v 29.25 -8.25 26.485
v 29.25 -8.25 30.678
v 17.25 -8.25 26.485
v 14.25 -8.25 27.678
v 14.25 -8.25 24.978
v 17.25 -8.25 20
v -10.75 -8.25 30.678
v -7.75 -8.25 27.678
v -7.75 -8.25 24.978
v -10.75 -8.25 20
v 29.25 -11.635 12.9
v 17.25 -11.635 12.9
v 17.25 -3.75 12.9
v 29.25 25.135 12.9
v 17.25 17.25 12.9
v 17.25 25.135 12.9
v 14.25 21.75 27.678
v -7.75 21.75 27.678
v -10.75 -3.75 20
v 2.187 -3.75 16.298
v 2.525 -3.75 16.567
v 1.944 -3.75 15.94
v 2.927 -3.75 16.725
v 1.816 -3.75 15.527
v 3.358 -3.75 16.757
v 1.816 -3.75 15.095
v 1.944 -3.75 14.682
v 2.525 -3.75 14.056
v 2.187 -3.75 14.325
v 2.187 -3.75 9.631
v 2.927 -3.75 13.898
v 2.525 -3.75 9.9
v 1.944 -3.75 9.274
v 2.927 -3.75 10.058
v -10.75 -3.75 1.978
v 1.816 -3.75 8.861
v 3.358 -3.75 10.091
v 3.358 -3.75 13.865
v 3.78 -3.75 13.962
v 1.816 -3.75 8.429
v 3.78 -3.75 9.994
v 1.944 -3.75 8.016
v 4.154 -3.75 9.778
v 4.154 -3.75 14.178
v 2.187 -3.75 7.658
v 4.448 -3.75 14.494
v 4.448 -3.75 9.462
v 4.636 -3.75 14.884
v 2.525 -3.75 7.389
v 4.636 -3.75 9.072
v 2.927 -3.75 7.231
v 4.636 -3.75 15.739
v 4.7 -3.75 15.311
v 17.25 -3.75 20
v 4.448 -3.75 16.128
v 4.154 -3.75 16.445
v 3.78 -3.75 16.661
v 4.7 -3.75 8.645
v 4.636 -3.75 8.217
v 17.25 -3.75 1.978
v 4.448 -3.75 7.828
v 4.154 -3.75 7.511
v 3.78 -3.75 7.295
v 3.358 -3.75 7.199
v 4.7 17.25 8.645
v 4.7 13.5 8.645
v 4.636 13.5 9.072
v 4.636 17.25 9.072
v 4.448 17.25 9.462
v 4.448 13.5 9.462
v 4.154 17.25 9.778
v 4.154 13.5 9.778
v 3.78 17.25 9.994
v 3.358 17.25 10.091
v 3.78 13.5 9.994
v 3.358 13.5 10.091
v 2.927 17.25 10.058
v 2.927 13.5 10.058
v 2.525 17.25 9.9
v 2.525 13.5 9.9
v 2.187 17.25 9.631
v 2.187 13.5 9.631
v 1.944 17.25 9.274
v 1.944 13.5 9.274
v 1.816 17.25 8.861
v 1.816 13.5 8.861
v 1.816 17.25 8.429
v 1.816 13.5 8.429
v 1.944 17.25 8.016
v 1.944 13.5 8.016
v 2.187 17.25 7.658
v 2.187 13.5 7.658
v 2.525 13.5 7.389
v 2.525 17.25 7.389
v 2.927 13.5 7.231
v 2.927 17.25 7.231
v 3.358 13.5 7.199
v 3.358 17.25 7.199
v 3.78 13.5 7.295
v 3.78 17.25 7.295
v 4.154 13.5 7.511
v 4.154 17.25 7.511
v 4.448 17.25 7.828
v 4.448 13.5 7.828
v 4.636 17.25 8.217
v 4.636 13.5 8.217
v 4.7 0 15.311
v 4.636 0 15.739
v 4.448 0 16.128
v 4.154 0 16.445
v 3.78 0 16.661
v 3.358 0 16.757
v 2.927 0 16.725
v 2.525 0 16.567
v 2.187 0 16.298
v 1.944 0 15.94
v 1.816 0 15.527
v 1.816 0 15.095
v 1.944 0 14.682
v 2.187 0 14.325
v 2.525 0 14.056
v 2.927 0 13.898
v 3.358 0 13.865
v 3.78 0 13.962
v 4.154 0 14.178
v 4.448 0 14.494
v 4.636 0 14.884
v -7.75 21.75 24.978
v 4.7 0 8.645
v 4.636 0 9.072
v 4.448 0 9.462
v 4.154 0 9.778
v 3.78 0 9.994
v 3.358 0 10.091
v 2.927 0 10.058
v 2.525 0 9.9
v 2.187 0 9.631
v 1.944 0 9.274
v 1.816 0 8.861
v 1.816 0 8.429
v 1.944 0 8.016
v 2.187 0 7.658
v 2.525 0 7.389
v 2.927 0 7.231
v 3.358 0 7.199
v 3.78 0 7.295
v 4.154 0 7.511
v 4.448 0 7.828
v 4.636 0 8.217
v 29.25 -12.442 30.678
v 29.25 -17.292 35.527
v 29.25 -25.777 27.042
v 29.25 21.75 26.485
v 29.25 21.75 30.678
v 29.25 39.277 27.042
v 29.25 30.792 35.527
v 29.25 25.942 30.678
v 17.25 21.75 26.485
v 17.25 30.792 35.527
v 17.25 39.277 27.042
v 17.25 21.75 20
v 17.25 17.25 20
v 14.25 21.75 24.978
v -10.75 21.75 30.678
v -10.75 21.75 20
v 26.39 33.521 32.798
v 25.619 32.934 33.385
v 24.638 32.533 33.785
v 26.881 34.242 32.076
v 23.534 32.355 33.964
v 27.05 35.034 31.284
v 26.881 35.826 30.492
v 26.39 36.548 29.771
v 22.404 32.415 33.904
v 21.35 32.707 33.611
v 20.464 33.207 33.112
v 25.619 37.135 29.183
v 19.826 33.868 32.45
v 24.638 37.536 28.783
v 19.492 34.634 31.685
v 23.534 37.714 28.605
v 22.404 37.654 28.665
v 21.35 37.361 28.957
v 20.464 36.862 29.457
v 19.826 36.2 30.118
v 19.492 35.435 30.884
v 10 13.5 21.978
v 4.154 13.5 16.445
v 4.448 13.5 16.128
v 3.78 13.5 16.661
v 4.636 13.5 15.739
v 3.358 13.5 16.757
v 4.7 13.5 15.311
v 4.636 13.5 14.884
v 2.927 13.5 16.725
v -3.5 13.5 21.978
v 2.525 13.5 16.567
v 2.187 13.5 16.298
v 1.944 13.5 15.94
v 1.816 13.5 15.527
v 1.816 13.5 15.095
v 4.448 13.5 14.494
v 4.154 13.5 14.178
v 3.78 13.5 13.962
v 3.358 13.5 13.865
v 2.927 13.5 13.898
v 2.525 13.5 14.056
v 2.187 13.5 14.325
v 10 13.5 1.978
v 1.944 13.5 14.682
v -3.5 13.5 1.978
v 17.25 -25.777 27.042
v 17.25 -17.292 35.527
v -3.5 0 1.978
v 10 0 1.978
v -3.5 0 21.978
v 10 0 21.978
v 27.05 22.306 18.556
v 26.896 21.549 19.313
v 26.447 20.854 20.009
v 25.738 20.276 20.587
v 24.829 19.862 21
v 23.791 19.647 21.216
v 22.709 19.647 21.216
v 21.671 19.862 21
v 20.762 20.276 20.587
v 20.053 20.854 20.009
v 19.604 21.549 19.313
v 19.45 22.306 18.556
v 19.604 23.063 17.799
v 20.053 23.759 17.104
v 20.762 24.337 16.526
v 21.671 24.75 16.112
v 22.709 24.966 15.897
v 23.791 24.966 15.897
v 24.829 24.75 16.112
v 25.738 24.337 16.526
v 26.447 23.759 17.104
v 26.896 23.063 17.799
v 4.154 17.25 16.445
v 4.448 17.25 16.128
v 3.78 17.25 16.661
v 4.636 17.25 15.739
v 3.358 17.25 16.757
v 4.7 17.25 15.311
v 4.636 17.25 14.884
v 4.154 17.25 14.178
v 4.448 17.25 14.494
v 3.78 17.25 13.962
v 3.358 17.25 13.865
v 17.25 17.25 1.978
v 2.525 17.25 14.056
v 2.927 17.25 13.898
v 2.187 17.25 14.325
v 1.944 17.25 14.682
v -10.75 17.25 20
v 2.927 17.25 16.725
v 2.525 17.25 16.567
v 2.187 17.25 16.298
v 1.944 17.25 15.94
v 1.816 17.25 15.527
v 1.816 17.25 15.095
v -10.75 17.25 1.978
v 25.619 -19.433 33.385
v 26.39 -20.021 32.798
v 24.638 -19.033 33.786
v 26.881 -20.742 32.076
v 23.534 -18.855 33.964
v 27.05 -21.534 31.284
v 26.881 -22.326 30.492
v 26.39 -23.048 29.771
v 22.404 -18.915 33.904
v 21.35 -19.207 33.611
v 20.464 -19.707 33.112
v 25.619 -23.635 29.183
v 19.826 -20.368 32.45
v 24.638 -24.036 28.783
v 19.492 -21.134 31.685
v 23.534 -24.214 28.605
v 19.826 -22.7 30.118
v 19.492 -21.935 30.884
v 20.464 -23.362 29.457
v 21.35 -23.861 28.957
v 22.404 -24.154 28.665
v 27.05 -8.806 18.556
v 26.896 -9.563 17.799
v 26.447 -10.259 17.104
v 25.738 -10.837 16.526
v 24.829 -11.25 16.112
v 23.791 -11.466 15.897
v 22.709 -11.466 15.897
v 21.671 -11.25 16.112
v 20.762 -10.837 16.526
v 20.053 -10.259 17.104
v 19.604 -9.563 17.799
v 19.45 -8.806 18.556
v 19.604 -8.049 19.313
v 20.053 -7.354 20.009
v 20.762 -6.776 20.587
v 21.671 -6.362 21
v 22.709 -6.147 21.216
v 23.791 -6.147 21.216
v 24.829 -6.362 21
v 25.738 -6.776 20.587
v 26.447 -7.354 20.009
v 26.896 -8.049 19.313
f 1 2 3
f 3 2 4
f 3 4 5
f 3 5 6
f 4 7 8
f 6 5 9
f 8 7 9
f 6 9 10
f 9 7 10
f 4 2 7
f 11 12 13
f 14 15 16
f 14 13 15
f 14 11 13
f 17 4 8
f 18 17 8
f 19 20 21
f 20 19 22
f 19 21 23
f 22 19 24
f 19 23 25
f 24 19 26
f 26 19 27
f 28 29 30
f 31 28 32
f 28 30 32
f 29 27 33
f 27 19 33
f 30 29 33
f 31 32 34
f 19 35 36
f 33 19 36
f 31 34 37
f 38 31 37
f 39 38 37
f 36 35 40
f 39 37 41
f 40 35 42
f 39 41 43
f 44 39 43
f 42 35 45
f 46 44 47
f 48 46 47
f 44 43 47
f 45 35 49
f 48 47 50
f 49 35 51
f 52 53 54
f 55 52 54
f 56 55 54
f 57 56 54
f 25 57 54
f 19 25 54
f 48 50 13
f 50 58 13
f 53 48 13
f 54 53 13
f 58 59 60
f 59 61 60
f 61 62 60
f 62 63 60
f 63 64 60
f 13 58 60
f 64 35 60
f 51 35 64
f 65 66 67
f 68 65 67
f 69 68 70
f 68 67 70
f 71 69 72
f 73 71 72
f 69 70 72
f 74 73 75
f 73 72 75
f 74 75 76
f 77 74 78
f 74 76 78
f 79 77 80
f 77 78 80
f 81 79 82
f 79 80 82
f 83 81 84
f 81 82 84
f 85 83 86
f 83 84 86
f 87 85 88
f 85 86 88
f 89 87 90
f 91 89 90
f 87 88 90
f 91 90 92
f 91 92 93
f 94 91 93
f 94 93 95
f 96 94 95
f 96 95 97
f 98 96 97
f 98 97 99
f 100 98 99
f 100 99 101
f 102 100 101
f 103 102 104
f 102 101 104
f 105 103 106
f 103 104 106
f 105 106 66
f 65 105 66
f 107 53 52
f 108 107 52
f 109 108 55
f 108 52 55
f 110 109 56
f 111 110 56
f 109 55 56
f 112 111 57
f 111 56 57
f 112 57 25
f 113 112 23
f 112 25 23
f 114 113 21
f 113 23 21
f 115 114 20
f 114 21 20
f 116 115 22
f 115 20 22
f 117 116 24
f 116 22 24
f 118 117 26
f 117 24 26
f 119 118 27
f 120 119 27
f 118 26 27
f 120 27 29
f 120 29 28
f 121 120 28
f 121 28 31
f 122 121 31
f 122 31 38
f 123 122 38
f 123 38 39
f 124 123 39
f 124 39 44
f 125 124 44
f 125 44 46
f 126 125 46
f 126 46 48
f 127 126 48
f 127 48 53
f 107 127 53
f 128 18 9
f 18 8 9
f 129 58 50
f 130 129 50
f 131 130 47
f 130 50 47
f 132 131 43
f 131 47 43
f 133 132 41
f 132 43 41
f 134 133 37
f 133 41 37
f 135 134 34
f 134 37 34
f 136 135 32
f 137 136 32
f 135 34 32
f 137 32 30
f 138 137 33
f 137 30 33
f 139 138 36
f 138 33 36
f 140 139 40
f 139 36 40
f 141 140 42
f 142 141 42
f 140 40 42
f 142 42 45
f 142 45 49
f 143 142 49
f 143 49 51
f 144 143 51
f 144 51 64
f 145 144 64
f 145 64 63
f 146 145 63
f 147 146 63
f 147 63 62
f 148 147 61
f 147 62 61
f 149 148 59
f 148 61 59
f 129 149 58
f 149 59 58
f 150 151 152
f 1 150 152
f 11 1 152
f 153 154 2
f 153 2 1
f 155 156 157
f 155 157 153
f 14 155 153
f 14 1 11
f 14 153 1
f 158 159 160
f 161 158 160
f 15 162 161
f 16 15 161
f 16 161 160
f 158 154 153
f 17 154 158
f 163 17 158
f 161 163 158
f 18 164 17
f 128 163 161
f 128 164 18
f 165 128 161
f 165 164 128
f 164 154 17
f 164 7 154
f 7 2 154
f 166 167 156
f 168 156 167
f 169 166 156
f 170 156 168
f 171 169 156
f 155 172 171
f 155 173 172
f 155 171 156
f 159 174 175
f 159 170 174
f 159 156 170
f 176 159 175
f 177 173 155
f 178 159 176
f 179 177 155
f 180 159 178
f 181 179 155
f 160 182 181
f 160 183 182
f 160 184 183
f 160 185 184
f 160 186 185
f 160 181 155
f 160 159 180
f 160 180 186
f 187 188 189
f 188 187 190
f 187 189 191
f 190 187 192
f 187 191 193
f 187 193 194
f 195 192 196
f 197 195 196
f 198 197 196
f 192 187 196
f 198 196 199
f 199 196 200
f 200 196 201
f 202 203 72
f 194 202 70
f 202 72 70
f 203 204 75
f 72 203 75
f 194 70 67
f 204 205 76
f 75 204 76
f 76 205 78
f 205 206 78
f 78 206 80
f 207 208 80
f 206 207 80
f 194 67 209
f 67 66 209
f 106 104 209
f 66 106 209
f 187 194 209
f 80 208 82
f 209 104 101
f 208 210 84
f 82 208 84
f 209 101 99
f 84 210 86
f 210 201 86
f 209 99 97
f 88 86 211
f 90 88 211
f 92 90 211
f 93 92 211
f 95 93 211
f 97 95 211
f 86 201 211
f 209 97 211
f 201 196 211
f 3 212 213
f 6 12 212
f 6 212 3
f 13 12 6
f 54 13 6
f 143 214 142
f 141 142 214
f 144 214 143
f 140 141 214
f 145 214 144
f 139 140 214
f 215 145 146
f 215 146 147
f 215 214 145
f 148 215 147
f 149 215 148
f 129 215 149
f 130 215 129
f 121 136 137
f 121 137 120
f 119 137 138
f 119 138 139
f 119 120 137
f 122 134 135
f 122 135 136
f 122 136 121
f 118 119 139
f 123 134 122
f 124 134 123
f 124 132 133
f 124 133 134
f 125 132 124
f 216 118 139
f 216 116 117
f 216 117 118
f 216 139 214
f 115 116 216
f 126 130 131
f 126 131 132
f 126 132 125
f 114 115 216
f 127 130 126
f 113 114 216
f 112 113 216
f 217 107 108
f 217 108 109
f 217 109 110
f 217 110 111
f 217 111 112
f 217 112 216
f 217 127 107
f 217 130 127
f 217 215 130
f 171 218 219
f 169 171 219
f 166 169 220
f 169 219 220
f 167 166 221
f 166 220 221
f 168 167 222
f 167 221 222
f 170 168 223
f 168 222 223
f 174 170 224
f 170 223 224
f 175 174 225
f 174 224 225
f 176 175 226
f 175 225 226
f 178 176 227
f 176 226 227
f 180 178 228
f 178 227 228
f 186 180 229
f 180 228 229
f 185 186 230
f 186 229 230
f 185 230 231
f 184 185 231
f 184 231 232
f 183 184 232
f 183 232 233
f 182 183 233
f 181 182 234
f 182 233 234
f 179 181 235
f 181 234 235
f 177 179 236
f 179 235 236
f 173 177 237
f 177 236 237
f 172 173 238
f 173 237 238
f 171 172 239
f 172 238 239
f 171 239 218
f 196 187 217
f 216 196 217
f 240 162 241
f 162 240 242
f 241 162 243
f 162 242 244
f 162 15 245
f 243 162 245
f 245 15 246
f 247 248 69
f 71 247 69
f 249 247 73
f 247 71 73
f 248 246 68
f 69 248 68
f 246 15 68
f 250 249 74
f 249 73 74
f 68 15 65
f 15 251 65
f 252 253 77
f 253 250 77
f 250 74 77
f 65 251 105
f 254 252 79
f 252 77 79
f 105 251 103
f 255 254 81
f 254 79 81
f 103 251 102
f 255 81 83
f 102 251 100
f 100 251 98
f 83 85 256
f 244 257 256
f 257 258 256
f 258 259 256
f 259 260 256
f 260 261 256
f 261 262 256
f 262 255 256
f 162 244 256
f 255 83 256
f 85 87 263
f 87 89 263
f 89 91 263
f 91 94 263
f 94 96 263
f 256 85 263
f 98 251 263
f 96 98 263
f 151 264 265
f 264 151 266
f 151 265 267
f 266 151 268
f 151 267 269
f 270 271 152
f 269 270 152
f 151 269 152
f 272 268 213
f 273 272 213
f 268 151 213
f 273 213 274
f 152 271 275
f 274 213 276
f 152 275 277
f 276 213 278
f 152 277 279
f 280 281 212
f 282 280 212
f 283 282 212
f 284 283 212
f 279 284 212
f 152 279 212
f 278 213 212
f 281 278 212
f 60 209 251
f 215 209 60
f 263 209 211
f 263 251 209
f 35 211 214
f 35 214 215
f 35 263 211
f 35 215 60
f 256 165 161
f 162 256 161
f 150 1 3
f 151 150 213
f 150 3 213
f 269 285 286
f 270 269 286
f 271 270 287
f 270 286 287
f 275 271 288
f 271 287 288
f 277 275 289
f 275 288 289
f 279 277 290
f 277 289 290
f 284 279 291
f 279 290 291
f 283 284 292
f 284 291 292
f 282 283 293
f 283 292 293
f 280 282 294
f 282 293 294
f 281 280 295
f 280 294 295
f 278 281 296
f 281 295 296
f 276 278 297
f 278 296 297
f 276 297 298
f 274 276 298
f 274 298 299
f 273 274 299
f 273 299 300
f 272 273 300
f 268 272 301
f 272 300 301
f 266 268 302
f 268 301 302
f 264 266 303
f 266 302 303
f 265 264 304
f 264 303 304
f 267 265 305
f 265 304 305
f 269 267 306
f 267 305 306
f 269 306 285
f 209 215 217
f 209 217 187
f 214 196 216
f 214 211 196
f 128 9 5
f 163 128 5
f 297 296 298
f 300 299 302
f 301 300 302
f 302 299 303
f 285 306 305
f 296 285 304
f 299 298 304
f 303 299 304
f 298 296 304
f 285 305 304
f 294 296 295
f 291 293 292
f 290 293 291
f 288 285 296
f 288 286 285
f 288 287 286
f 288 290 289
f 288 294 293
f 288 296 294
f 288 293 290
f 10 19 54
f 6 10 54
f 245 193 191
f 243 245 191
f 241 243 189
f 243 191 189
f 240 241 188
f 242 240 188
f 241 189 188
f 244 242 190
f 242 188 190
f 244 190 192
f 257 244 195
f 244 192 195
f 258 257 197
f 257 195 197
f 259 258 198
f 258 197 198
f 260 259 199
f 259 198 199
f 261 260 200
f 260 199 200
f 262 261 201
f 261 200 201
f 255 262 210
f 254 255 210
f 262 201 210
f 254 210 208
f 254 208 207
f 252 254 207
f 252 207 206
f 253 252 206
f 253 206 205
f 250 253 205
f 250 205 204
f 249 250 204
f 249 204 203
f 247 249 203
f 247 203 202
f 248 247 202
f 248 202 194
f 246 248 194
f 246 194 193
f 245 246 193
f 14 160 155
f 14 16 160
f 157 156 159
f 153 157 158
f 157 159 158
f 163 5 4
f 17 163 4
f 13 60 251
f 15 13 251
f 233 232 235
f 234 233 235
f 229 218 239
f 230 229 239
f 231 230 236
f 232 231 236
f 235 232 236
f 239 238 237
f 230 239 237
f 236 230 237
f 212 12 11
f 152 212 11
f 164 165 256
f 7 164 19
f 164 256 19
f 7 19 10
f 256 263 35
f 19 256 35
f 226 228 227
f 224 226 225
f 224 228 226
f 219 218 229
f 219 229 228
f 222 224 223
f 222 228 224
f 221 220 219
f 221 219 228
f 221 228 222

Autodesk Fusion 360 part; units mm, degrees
sketch "Sketch1" plane through (0, 0, 0) normal (0, 0, 1) x (1, 0, 0)
  line L0 (0, 0) -> (13.5, 0)
  line L1 (13.5, 0) -> (13.5, 13.5)
  line L2 (13.5, 13.5) -> (0, 13.5)
  line L3 (0, 13.5) -> (0, 0)
  line L4 (-3.75, -3.75) -> (17.25, -3.75)
  line L5 (17.25, -3.75) -> (17.25, 17.25)
  line L6 (17.25, 17.25) -> (-3.75, 17.25)
  line L7 (-3.75, 17.25) -> (-3.75, -3.75)
  dimension "d1" = 13.5
  dimension "d2" = 13.5
  dimension "d3" = 3.75
extrude "Extrude1" add sketch "Sketch1" along normal blind 20
sketch "Sketch2" plane through (0, 0, 20) normal (0, 0, 1) x (1, 0, 0)
  line L0 (0, 0) -> (0, 13.5)
  line L1 (0, 13.5) -> (13.5, 13.5)
  line L2 (13.5, 13.5) -> (13.5, 0)
  line L3 (13.5, 0) -> (0, 0)
  line L4 (-3.75, 17.25) -> (-3.75, -3.75)
  line L5 (-3.75, -3.75) -> (17.25, -3.75)
  line L6 (17.25, -3.75) -> (17.25, 17.25)
  line L7 (17.25, 17.25) -> (-3.75, 17.25)
  line L8 (6.75, 6.75) -> (6.75, 21.75)
  line L9 (6.75, 6.75) -> (6.75, -8.25)
  line L10 (6.75, 6.75) -> (17.25, 6.75)
  line L11 (17.25, 6.75) -> (17.25, 21.75)
  line L12 (17.25, 21.75) -> (6.75, 21.75)
  line L13 (6.75, -8.25) -> (17.25, -8.25)
  line L14 (17.25, -8.25) -> (17.25, 6.75)
  line L15 (6.75, 6.75) -> (-3.75, 6.75)
  line L16 (-3.75, 6.75) -> (-3.75, 21.75)
  line L17 (-3.75, 21.75) -> (6.75, 21.75)
  line L18 (6.75, -8.25) -> (-3.75, -8.25)
  line L19 (-3.75, -8.25) -> (-3.75, 6.75)
  dimension "d6" = 15
  dimension "d7" = 15
  dimension "d8" = 15
extrude "Extrude2" add sketch "Sketch2" along normal blind 3
sketch "Sketch3" plane through (17.25, 0, 0) normal (1, 0, 0) x (0, 0, -1)
  line L0 (0, -3.75) -> (0, 17.25)
  line L1 (0, 17.25) -> (-20, 17.25)
  line L2 (-20, 17.25) -> (-20, 21.75)
  line L3 (-20, 21.75) -> (-23, 21.75)
  line L4 (-23, 21.75) -> (-23, -8.25)
  line L5 (-23, -8.25) -> (-20, -8.25)
  line L6 (-20, -8.25) -> (-20, -3.75)
  line L7 (-20, -3.75) -> (0, -3.75)
  line L8 (-23, 6.75) -> (0, 6.75)
  line L9 (-3, 6.75) -> (-13.6066, -3.8566)
  line L10 (-7.2426, 10.9926) -> (-17.8492, 0.386)
  line L11 (1.2426, 2.5074) -> (-9.364, -8.0992)
  line L12 (-7.2426, 2.5074) -> (-17.8492, 13.114)
  line L13 (-3, 6.75) -> (-13.6066, 17.3566)
  line L14 (1.2426, 10.9926) -> (-9.364, 21.5992)
  line L15 (-3, 6.75) -> (1.2426, 10.9926)
  line L16 (-3, 6.75) -> (1.2426, 2.5074)
  line L17 (-17.8492, 13.114) -> (-9.364, 21.5992)
  line L18 (-17.8492, 0.386) -> (-9.364, -8.0992)
  dimension "d14" = 45
  dimension "d15" = 6
  dimension "d16" = -6
  dimension "d17" = 15
  dimension "d18" = 20
extrude "Extrude3" add sketch "Sketch3" along normal blind 12 contours L0 L7 L9 L11 L16 | L7 L9 L11 L18 | L7 L9 L18 | L7 L9 L10 L12 L18 | L8 L9 L12 | L8 L10 L13 | L0 L1 L13 L14 L15 | L1 L10 L12 L13 L17 | L1 L13 L14 L17 | L1 L13 L17
sketch "Sketch4" plane through (0, -8.7316, 8.7316) normal (0, -0.7071, 0.7071) x (1, 0, 0)
  line L0 (17.25, 12.8943) -> (17.25, 7.045)
  line L1 (17.25, 7.045) -> (17.25, 0.8943)
  line L2 (17.25, 0.8943) -> (29.25, 0.8943)
  line L3 (29.25, 0.8943) -> (29.25, 12.8943)
  line L4 (29.25, 12.8943) -> (17.25, 12.8943)
  circle A0 centre (23.25, 6.8943) radius 3.8
  dimension "d21" = 7.6
extrude "Extrude4" cut sketch "Sketch4" against normal blind 10 contours A0
sketch "Sketch5" plane through (0, 15.4816, 15.4816) normal (0, 0.7071, 0.7071) x (1, 0, 0)
  line L0 (17.25, 2.5009) -> (17.25, -3.3483)
  line L1 (17.25, -3.3483) -> (29.25, -3.3483)
  line L2 (29.25, -3.3483) -> (29.25, 8.6517)
  line L3 (29.25, 8.6517) -> (17.25, 8.6517)
  line L4 (17.25, 8.6517) -> (17.25, 2.5009)
  circle A0 centre (23.25, 2.6517) radius 3.8
  dimension "d24" = 7.6
extrude "Extrude5" cut sketch "Sketch5" against normal blind 10 contours A0
extrude "Extrude6" add 1 faces at (18.1088, -5.6239, 11.8393) along direction (0, -0.707107, 0.707107) blind 25
extrude "Extrude7" add 1 faces at (18.1088, 19.1239, 11.8393) along direction (0, 0.707107, 0.707107) blind 25
extrude "Extrude8" add 1 faces at (17.25, 6.75, 19.1618) along direction (1, 0, 0) blind 12
sketch "Sketch6" plane through (0, 0, 23) normal (0, 0, 1) x (1, 0, 0)
  line L0 (-3.75, -8.25) -> (17.25, -8.25)
  line L1 (17.25, -8.25) -> (17.25, -4.7647)
  line L2 (17.25, -4.7647) -> (29.25, -4.7647)
  line L3 (29.25, -4.7647) -> (29.25, 18.2647)
  line L4 (29.25, 18.2647) -> (17.25, 18.2647)
  line L5 (17.25, 18.2647) -> (17.25, 21.75)
  line L6 (17.25, 21.75) -> (-3.75, 21.75)
  line L7 (-3.75, 21.75) -> (-3.75, -8.25)
  line L8 (17.25, -8.25) -> (-3.75, -8.25)
  line L9 (-3.75, -8.25) -> (-3.75, 21.75)
  line L10 (-3.75, 21.75) -> (17.25, 21.75)
  line L11 (17.25, 21.75) -> (17.25, -8.25)
extrude "Extrude9" add sketch "Sketch6" along normal blind 5 contours L0 L1 L5 L6 L7 L8 L9 L10 L11
sketch "Sketch7" plane through (17.25, 0, 0) normal (1, 0, 0) x (0, 0, -1)
  line L0 (-26.4853, -8.25) -> (-23, -4.7647)
  line L1 (-23, -4.7647) -> (-23, 18.2647)
  line L2 (-23, 18.2647) -> (-26.4853, 21.75)
  line L3 (-26.4853, 21.75) -> (-28, 21.75)
  line L4 (-28, 21.75) -> (-28, -8.25)
  line L5 (-28, -8.25) -> (-26.4853, -8.25)
  line L6 (-28, -8.25) -> (-28, 21.75)
sketch "Sketch8" plane through (29.25, 0, 0) normal (1, 0, 0) x (0, 0, -1)
  line L0 (-23, -4.7647) -> (-35.5269, -17.2916)
  line L1 (-35.5269, -17.2916) -> (-27.0416, -25.7769)
  line L2 (-27.0416, -25.7769) -> (0, 1.2647)
  line L3 (0, 1.2647) -> (0, 3.75)
  line L4 (0, 3.75) -> (-3, 6.75)
  line L5 (-3, 6.75) -> (0, 9.75)
  line L6 (0, 9.75) -> (0, 12.2353)
  line L7 (0, 12.2353) -> (-27.0416, 39.2769)
  line L8 (-27.0416, 39.2769) -> (-35.5269, 30.7916)
  line L9 (-35.5269, 30.7916) -> (-23, 18.2647)
  line L10 (-23, 18.2647) -> (-23, -4.7647)
  line L11 (-29.2635, 24.5282) -> (-29.2635, -11.0282)
  line L12 (-29.2635, 24.5282) -> (-29.9706, 25.2353)
  line L13 (-29.2635, -11.0282) -> (-29.9706, -11.7353)
  line L14 (-29.9706, -11.7353) -> (-29.9706, 25.2353)
  line L15 (-29.9706, 25.2353) -> (-30.6777, 25.9424)
  line L16 (-29.9706, -11.7353) -> (-30.6777, -12.4424)
  line L17 (-30.6777, -12.4424) -> (-30.6777, 25.9424)
  dimension "d35" = 1
  dimension "d36" = 1
  dimension "d37" = 1
  dimension "d38" = 1
extrude "Extrude10" add sketch "Sketch8" against normal blind 33 contours L0 L9 L10 L11 | L0 L9 L11 L12 L13 L14 | L0 L9 L14 L15 L16 L17
sketch "Sketch9" plane through (-3.75, 0, 0) normal (-1, 0, 0) x (0, 0, 1)
  line L0 (26.4853, 21.75) -> (20, 21.75)
  line L1 (20, 21.75) -> (20, 17.25)
  line L2 (20, 17.25) -> (0, 17.25)
  line L3 (0, 17.25) -> (0, -3.75)
  line L4 (0, -3.75) -> (20, -3.75)
  line L5 (20, -3.75) -> (20, -8.25)
  line L6 (20, -8.25) -> (26.4853, -8.25)
  line L7 (26.4853, -8.25) -> (30.6777, -12.4424)
  line L8 (30.6777, -12.4424) -> (30.6777, 25.9424)
  line L9 (30.6777, 25.9424) -> (26.4853, 21.75)
  line L10 (26.4853, 21.75) -> (35, 21.75)
  line L11 (26.4853, -8.25) -> (40, -8.25)
extrude "Extrude11" cut sketch "Sketch9" against normal blind 40 contours L8 L9 L10 | L7 L8 L11
sketch "Sketch10" plane through (29.25, 0, 0) normal (1, 0, 0) x (0, 0, -1)
  line L0 (-30.6777, -8.25) -> (-26.4853, -8.25)
  line L1 (-26.4853, -8.25) -> (-35.5269, -17.2916)
  line L2 (-35.5269, -17.2916) -> (-27.0416, -25.7769)
  line L3 (-27.0416, -25.7769) -> (0, 1.2647)
  line L4 (0, 1.2647) -> (0, 3.75)
  line L5 (0, 3.75) -> (-3, 6.75)
  line L6 (-3, 6.75) -> (0, 9.75)
  line L7 (0, 9.75) -> (0, 12.2353)
  line L8 (0, 12.2353) -> (-27.0416, 39.2769)
  line L9 (-27.0416, 39.2769) -> (-35.5269, 30.7916)
  line L10 (-35.5269, 30.7916) -> (-26.4853, 21.75)
  line L11 (-26.4853, 21.75) -> (-30.6777, 21.75)
  line L12 (-30.6777, 21.75) -> (-30.6777, -8.25)
  line L13 (-31.2843, -21.5343) -> (-17.1421, -7.3921)
  line L14 (-17.1421, -7.3921) -> (-12.8995, -11.6348)
  line L15 (-35.5269, -17.2916) -> (-21.3848, -3.1495)
  line L16 (-21.3848, -3.1495) -> (-17.1421, -7.3921)
  line L17 (-12.8995, -11.6348) -> (-12.8995, 25.1348)
  line L18 (-30.6777, 6.75) -> (-12.8995, 6.75)
  line L19 (-31.2843, 35.0343) -> (-17.1421, 20.8921)
  line L20 (-35.5269, 30.7916) -> (-21.3848, 16.6495)
  line L21 (-21.3848, 16.6495) -> (-17.1421, 20.8921)
  line L22 (-27.0416, 39.2769) -> (0, 12.2353)
  line L23 (-17.1421, 20.8921) -> (-12.8995, 25.1348)
  line L24 (-35.5269, 30.7916) -> (-27.0416, 39.2769)
  dimension "d43" = 20
  dimension "d44" = 20
extrude "Extrude12" cut sketch "Sketch10" against normal blind 12 contours L3 L4 L5 L6 L7 L8 L17 L22
sketch "Sketch11" plane through (0, 0, 12.8995) normal (0, 0, -1) x (-1, 0, 0)
  ellipse E0 centre (-23.25, 16.6495) end of major axis (-23.25, 11.2755) minor radius 3.8
  ellipse E1 centre (-23.25, -3.1495) end of major axis (-23.25, -8.5235) minor radius 3.8
  line L0 (-29.25, 25.1348) -> (-29.25, -11.6348)
  line L1 (-29.25, -11.6348) -> (-17.25, -11.6348)
  line L2 (-17.25, -11.6348) -> (-17.25, -3.75)
  line L3 (-17.25, -3.75) -> (-17.25, 17.25)
  line L4 (-17.25, 17.25) -> (-17.25, 25.1348)
  line L5 (-17.25, 25.1348) -> (-29.25, 25.1348)
  line L6 (-17.25, -11.6348) -> (-29.25, -11.6348)
  line L7 (-29.25, -11.6348) -> (-29.25, 25.1348)
  line L8 (-29.25, 25.1348) -> (-17.25, 25.1348)
  line L9 (-17.25, 25.1348) -> (-17.25, -11.6348)
sketch "Sketch12" plane through (29.25, 0, 0) normal (1, 0, 0) x (0, 0, -1)
  line L0 (-12.8995, -11.6348) -> (-12.8995, 25.1348)
  line L1 (-12.8995, 25.1348) -> (-27.0416, 39.2769)
  line L2 (-27.0416, 39.2769) -> (-35.5269, 30.7916)
  line L3 (-35.5269, 30.7916) -> (-26.4853, 21.75)
  line L4 (-26.4853, 21.75) -> (-30.6777, 21.75)
  line L5 (-30.6777, 21.75) -> (-30.6777, -8.25)
  line L6 (-30.6777, -8.25) -> (-26.4853, -8.25)
  line L7 (-26.4853, -8.25) -> (-35.5269, -17.2916)
  line L8 (-35.5269, -17.2916) -> (-27.0416, -25.7769)
  line L9 (-27.0416, -25.7769) -> (-12.8995, -11.6348)
  line L10 (-31.2843, -21.5343) -> (-18.5563, -8.8063)
  line L11 (-18.5563, -8.8063) -> (-14.3137, -13.049)
  line L12 (-18.5563, -8.8063) -> (-30.6777, 3.315)
  line L13 (-30.6777, 6.75) -> (-12.8995, 6.75)
  line L14 (-18.5563, 22.3063) -> (-30.6777, 10.185)
  line L15 (-18.5563, 22.3063) -> (-14.3137, 26.549)
  dimension "d47" = 18
extrude "Extrude13" add sketch "Sketch12" against normal blind 12 contours L0 L5 L9 L11 L12 L13 | L0 L1 L5 L13 L14 L15
extrude "Extrude14" cut 1 faces at (4.5, 9, 20) along direction (0, 0, 1) blind 5
sketch "Sketch13" plane through (0, -8.25, 0) normal (0, -1, 0) x (1, 0, 0)
  line L0 (17.25, 20) -> (17.25, 26.4853)
  line L1 (17.25, 26.4853) -> (29.25, 26.4853)
  line L2 (29.25, 26.4853) -> (29.25, 30.6777)
  line L3 (6.75, 20) -> (6.75, 24.9777)
  line L4 (6.75, 24.9777) -> (6.75, 25.9777)
extrude "Extrude15" add 1 faces at (-3.75, 10.25, 6.6667) along direction (-1, 0, 0) blind 9
extrude "Extrude16" cut 1 faces at (0, 9, 8.3333) along direction (-1, 0, 0) blind 9
extrude "Extrude17" add 1 faces at (13.5, 4.5, 8.3333) along direction (-1, 0, 0) blind 9
extrude "Extrude18" cut 1 faces at (4.5, 4.5, 8.3333) along direction (1, 0, 0) blind 8.25
extrude "Extrude19" add 1 faces at (-9, 9, 8.3333) along direction (1, 0, 0) blind 8.25
extrude "Extrude20" add 1 faces at (3.75, 9, 25) along direction (0, 0, -1) blind 25
sketch "Sketch14" plane through (0, 0, 0) normal (0, 0, -1) x (-1, 0, 0)
  line L0 (-17.25, 17.25) -> (-17.25, -3.75)
  line L1 (-17.25, -3.75) -> (12.75, -3.75)
  line L2 (12.75, -3.75) -> (12.75, 17.25)
  line L3 (12.75, 17.25) -> (-17.25, 17.25)
  line L4 (-9, 13.5) -> (4.5, 13.5)
  line L5 (4.5, 13.5) -> (4.5, 0)
  line L6 (4.5, 0) -> (-9, 0)
  line L7 (-9, 0) -> (-9, 13.5)
  line L8 (-17.25, 25.1348) -> (-17.25, -11.6348)
  dimension "d70" = 13.5
  dimension "d71" = 13.5
  dimension "d72" = 8.25
  dimension "d73" = 8.25
  dimension "d74" = 3.75
  dimension "d75" = 21
  dimension "d76" = 13.5
  dimension "d77" = 3.75
extrude "Extrude21" cut sketch "Sketch14" against normal blind 20 contours L4 L5 L6 L7
sketch "Sketch15" plane through (0, -8.25, 0) normal (0, -1, 0) x (1, 0, 0)
  line L0 (-12.75, 20) -> (17.25, 20)
  line L1 (17.25, 20) -> (17.25, 26.4853)
  line L2 (17.25, 26.4853) -> (29.25, 26.4853)
  line L3 (29.25, 26.4853) -> (29.25, 30.6777)
  line L4 (29.25, 30.6777) -> (-12.75, 30.6777)
  line L5 (-12.75, 30.6777) -> (-12.75, 20)
  line L6 (-12.75, 20) -> (17.25, 20)
  line L7 (2.25, 20) -> (2.25, 30.6777)
  line L8 (2.25, 30.6777) -> (2.25, 27.6777)
  line L9 (2.25, 27.6777) -> (13.25, 27.6777)
  line L10 (2.25, 27.6777) -> (-8.75, 27.6777)
  line L11 (-8.75, 27.6777) -> (-8.75, 24.9777)
  line L12 (-8.75, 24.9777) -> (13.25, 24.9777)
  line L13 (13.25, 24.9777) -> (13.25, 27.6777)
  line L14 (2.25, 24.9777) -> (2.25, 21.9777)
  line L15 (2.25, 20) -> (2.25, 21.9777)
  dimension "d80" = 3
  dimension "d81" = 11
  dimension "d82" = 11
  dimension "d83" = 2.7
  dimension "d84" = 22
  dimension "d85" = 3
  dimension "d86" = 1.9777
extrude "Extrude22" cut sketch "Sketch15" against normal blind 36 contours L7 L10 L11 L12 | L7 L9 L12 L13
extrude "Extrude23" cut 1 faces at (4.5, 4.5, 20) along direction (0, 0, 1) blind 1.978
extrude "Extrude24" cut 1 faces at (-10, 9, 0) along direction (0, 0, 1) blind 1.978
extrude "Extrude25" cut 1 faces at (13.25, 1.75, 25.8777) along direction (1, 0, 0) blind 1
extrude "Extrude26" add 1 faces at (-8.75, 1.75, 26.7777) along direction (1, 0, 0) blind 1
extrude "Extrude27" cut 1 faces at (9, 4.5, 8.6447) along direction (1, 0, 0) blind 1
extrude "Extrude28" add 1 faces at (-4.5, 9, 8.6447) along direction (1, 0, 0) blind 1
extrude "Extrude29" cut 1 faces at (-12.75, 10.25, 7.9853) along direction (1, 0, 0) blind 2
sketch "Sketch16" plane through (0, -3.75, 0) normal (0, -1, 0) x (1, 0, 0)
  line L0 (-10.75, 20) -> (-10.75, 1.978)
  line L1 (-10.75, 1.978) -> (17.25, 1.978)
  line L2 (17.25, 1.978) -> (17.25, 12.8995)
  line L3 (17.25, 12.8995) -> (17.25, 20)
  line L4 (17.25, 20) -> (-10.75, 20)
  line L5 (3.25, 1.978) -> (3.25, 8.6447)
  circle A0 centre (3.25, 8.6447) radius 1.45
  circle A1 centre (3.25, 15.3113) radius 1.45
  dimension "d103" = 6.6667
  dimension "d104" = 2.9
  dimension "d105" = 2.9
  dimension "d106" = 6.6667
extrude "Extrude30" cut sketch "Sketch16" against normal blind 31 contours A0 | A1
equation "d103 = ( 20 / 3 ) * 1 mm"
equation "d106 = ( 20 / 3 ) * 1 mm"
